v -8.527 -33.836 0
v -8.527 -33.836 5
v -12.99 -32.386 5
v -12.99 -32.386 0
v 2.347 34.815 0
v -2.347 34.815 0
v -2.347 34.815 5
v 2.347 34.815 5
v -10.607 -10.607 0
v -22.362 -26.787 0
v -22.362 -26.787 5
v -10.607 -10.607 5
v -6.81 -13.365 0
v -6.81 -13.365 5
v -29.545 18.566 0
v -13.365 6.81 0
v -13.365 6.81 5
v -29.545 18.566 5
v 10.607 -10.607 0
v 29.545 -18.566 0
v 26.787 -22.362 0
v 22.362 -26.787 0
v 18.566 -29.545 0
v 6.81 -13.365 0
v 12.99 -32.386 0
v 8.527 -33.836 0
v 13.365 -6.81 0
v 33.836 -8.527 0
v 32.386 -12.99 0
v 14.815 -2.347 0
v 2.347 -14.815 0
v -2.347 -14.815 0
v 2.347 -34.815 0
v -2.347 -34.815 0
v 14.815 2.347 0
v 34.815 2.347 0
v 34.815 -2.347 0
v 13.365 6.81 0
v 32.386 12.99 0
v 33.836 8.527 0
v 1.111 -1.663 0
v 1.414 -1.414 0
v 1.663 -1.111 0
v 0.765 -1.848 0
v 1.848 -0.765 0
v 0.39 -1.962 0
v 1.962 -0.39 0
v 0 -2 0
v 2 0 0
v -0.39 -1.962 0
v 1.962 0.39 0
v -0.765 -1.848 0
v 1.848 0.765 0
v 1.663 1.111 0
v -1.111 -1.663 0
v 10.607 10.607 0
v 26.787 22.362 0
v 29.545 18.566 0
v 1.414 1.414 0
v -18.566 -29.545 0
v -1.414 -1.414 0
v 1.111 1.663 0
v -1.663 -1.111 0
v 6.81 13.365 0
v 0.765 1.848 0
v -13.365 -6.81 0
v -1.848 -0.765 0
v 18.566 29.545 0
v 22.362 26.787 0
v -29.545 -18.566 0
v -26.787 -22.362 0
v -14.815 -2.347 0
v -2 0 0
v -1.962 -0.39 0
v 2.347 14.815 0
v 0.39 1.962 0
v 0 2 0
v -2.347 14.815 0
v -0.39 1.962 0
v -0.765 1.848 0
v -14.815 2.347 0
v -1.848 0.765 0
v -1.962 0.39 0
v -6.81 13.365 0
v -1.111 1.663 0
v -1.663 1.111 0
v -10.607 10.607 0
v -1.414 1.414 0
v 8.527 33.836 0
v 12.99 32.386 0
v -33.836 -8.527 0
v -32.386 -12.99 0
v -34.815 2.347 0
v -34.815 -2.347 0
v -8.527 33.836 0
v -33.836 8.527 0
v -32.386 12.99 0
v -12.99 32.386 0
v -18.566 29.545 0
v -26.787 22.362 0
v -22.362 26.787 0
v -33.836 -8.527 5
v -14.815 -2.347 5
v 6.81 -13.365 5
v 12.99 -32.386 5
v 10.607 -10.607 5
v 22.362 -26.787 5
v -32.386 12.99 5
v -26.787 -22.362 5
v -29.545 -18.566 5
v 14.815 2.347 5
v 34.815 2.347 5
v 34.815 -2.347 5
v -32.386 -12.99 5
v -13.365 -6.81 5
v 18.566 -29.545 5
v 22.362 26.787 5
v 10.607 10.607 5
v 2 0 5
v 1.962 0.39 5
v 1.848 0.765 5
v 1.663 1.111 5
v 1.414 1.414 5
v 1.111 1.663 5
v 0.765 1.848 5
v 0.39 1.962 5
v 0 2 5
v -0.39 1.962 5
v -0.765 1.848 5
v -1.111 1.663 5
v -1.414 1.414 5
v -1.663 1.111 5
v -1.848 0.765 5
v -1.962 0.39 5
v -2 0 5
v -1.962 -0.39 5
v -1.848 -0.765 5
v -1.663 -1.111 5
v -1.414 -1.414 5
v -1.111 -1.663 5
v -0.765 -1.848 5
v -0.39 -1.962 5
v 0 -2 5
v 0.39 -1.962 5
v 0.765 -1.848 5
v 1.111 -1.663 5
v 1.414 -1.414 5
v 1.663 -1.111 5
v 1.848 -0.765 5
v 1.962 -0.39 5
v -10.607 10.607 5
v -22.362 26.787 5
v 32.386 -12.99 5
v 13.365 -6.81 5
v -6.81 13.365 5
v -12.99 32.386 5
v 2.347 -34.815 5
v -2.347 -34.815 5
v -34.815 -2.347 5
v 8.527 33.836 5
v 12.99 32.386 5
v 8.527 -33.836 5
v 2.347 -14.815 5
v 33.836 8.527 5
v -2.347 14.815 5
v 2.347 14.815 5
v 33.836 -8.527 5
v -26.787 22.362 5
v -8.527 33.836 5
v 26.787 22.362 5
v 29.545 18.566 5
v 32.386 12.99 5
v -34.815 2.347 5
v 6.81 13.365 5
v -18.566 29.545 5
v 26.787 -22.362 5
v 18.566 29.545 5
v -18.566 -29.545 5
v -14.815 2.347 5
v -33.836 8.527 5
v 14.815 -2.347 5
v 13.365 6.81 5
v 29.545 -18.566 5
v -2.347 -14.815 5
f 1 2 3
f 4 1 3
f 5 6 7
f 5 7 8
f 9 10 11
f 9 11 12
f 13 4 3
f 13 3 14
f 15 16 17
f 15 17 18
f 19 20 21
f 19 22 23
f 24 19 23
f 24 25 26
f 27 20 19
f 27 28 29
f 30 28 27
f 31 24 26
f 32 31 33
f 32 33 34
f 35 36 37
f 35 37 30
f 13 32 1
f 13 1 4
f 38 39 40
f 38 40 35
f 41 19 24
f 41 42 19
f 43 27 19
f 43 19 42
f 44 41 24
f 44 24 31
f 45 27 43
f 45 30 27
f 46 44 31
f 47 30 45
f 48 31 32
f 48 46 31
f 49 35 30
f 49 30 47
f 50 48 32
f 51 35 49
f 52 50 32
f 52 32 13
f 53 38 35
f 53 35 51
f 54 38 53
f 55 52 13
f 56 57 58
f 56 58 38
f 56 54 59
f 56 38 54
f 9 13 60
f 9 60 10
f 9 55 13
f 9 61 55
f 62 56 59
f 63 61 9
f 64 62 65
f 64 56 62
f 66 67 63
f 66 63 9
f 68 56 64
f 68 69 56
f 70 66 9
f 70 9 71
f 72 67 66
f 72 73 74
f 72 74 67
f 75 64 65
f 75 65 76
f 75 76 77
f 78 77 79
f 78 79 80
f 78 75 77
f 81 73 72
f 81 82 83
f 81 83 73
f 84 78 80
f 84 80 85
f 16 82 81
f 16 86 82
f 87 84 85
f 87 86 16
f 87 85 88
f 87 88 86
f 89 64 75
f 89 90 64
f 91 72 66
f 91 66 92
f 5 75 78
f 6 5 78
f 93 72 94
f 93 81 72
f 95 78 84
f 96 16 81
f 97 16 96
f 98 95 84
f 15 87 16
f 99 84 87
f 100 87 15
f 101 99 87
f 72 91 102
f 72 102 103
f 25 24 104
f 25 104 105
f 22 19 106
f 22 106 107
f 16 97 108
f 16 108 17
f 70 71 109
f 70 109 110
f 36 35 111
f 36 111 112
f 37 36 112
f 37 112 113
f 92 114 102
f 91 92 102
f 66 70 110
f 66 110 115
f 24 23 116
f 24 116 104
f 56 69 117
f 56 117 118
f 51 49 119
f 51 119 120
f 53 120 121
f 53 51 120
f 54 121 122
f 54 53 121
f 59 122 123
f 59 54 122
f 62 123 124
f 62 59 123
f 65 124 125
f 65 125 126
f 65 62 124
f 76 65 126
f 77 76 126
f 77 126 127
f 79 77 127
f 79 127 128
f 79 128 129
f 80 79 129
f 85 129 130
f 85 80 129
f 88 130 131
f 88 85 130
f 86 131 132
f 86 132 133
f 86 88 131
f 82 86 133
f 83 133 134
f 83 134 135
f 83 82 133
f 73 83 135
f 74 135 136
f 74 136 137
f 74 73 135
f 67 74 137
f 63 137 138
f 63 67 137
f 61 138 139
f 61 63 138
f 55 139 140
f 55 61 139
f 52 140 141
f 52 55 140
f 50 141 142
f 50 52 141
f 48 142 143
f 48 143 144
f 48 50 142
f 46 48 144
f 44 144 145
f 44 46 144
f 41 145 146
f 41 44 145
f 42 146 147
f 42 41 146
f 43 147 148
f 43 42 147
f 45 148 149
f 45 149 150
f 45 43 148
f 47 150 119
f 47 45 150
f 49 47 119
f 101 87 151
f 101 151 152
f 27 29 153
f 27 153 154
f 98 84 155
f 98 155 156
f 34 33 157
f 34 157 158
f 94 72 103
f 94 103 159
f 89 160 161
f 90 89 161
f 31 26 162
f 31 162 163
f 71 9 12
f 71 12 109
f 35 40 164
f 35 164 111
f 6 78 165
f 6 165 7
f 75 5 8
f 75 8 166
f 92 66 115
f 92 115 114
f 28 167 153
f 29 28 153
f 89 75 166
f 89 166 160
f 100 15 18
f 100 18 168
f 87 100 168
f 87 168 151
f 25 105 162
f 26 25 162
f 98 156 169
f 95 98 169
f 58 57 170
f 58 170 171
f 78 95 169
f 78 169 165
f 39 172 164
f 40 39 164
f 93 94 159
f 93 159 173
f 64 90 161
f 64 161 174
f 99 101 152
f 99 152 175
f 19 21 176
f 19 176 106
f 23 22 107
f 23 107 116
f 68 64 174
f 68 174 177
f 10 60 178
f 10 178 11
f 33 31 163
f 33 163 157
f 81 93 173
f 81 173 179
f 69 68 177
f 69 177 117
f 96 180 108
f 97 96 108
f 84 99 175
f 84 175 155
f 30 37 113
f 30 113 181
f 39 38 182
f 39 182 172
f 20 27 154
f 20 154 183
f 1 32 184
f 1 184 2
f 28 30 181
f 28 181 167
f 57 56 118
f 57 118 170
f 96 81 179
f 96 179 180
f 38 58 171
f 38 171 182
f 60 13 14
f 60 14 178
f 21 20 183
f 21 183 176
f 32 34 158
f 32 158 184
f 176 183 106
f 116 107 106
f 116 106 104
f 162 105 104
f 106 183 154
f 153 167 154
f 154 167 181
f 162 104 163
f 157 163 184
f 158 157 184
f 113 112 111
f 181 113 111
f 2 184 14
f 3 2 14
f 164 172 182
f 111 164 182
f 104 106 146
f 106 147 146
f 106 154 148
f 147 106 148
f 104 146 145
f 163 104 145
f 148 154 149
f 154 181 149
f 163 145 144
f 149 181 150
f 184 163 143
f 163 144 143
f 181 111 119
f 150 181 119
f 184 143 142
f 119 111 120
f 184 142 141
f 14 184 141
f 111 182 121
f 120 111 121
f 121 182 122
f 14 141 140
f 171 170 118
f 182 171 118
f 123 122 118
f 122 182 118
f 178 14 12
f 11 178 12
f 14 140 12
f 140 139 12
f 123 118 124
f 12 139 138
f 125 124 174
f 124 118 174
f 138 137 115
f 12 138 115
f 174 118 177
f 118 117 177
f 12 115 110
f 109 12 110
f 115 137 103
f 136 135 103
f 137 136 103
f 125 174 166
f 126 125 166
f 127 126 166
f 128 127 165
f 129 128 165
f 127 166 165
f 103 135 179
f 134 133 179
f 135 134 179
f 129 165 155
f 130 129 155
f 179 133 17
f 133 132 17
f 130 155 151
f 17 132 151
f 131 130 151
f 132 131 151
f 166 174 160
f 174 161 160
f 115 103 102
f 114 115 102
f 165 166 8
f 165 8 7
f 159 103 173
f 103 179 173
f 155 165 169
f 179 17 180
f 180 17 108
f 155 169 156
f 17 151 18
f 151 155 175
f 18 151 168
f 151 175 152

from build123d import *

# Parameters (mm, degrees)
ESQUISSE1_R        = 2
BOSS_EXTRU_1_DEPTH = 5


with BuildPart() as part:
    # Esquisse1 → Boss.-Extru.1 (new body)
    with BuildSketch(Plane.XY):
        Polygon((-14.815325109, -2.346516976), (-34.815325109, -2.346516976), (-34.815325109, 2.346516976), (-14.815325109, 2.346516976), (-33.836455435, 8.526856863), (-32.386228189, 12.990197384), (-13.365097863, 6.809857496), (-29.54543775, 18.565562542), (-26.786941605, 22.362306764), (-10.606601718, 10.606601718), (-22.362306764, 26.786941605), (-18.565562542, 29.54543775), (-6.809857496, 13.365097863), (-12.990197384, 32.386228189), (-8.526856863, 33.836455435), (-2.346516976, 14.815325109), (-2.346516976, 34.815325109), (2.346516976, 34.815325109), (2.346516976, 14.815325109), (8.526856863, 33.836455435), (12.990197384, 32.386228189), (6.809857496, 13.365097863), (18.565562542, 29.54543775), (22.362306764, 26.786941605), (10.606601718, 10.606601718), (26.786941605, 22.362306764), (29.54543775, 18.565562542), (13.365097863, 6.809857496), (32.386228189, 12.990197384), (33.836455435, 8.526856863), (14.815325109, 2.346516976), (34.815325109, 2.346516976), (34.815325109, -2.346516976), (14.815325109, -2.346516976), (33.836455435, -8.526856863), (32.386228189, -12.990197384), (13.365097863, -6.809857496), (29.54543775, -18.565562542), (26.786941605, -22.362306764), (10.606601718, -10.606601718), (22.362306764, -26.786941605), (18.565562542, -29.54543775), (6.809857496, -13.365097863), (12.990197384, -32.386228189), (8.526856863, -33.836455435), (2.346516976, -14.815325109), (2.346516976, -34.815325109), (-2.346516976, -34.815325109), (-2.346516976, -14.815325109), (-8.526856863, -33.836455435), (-12.990197384, -32.386228189), (-6.809857496, -13.365097863), (-18.565562542, -29.54543775), (-22.362306764, -26.786941605), (-10.606601718, -10.606601718), (-26.786941605, -22.362306764), (-29.54543775, -18.565562542), (-13.365097863, -6.809857496), (-32.386228189, -12.990197384), (-33.836455435, -8.526856863), align=None)
        Circle(ESQUISSE1_R, mode=Mode.SUBTRACT)
    extrude(amount=BOSS_EXTRU_1_DEPTH)


solid = part.part
